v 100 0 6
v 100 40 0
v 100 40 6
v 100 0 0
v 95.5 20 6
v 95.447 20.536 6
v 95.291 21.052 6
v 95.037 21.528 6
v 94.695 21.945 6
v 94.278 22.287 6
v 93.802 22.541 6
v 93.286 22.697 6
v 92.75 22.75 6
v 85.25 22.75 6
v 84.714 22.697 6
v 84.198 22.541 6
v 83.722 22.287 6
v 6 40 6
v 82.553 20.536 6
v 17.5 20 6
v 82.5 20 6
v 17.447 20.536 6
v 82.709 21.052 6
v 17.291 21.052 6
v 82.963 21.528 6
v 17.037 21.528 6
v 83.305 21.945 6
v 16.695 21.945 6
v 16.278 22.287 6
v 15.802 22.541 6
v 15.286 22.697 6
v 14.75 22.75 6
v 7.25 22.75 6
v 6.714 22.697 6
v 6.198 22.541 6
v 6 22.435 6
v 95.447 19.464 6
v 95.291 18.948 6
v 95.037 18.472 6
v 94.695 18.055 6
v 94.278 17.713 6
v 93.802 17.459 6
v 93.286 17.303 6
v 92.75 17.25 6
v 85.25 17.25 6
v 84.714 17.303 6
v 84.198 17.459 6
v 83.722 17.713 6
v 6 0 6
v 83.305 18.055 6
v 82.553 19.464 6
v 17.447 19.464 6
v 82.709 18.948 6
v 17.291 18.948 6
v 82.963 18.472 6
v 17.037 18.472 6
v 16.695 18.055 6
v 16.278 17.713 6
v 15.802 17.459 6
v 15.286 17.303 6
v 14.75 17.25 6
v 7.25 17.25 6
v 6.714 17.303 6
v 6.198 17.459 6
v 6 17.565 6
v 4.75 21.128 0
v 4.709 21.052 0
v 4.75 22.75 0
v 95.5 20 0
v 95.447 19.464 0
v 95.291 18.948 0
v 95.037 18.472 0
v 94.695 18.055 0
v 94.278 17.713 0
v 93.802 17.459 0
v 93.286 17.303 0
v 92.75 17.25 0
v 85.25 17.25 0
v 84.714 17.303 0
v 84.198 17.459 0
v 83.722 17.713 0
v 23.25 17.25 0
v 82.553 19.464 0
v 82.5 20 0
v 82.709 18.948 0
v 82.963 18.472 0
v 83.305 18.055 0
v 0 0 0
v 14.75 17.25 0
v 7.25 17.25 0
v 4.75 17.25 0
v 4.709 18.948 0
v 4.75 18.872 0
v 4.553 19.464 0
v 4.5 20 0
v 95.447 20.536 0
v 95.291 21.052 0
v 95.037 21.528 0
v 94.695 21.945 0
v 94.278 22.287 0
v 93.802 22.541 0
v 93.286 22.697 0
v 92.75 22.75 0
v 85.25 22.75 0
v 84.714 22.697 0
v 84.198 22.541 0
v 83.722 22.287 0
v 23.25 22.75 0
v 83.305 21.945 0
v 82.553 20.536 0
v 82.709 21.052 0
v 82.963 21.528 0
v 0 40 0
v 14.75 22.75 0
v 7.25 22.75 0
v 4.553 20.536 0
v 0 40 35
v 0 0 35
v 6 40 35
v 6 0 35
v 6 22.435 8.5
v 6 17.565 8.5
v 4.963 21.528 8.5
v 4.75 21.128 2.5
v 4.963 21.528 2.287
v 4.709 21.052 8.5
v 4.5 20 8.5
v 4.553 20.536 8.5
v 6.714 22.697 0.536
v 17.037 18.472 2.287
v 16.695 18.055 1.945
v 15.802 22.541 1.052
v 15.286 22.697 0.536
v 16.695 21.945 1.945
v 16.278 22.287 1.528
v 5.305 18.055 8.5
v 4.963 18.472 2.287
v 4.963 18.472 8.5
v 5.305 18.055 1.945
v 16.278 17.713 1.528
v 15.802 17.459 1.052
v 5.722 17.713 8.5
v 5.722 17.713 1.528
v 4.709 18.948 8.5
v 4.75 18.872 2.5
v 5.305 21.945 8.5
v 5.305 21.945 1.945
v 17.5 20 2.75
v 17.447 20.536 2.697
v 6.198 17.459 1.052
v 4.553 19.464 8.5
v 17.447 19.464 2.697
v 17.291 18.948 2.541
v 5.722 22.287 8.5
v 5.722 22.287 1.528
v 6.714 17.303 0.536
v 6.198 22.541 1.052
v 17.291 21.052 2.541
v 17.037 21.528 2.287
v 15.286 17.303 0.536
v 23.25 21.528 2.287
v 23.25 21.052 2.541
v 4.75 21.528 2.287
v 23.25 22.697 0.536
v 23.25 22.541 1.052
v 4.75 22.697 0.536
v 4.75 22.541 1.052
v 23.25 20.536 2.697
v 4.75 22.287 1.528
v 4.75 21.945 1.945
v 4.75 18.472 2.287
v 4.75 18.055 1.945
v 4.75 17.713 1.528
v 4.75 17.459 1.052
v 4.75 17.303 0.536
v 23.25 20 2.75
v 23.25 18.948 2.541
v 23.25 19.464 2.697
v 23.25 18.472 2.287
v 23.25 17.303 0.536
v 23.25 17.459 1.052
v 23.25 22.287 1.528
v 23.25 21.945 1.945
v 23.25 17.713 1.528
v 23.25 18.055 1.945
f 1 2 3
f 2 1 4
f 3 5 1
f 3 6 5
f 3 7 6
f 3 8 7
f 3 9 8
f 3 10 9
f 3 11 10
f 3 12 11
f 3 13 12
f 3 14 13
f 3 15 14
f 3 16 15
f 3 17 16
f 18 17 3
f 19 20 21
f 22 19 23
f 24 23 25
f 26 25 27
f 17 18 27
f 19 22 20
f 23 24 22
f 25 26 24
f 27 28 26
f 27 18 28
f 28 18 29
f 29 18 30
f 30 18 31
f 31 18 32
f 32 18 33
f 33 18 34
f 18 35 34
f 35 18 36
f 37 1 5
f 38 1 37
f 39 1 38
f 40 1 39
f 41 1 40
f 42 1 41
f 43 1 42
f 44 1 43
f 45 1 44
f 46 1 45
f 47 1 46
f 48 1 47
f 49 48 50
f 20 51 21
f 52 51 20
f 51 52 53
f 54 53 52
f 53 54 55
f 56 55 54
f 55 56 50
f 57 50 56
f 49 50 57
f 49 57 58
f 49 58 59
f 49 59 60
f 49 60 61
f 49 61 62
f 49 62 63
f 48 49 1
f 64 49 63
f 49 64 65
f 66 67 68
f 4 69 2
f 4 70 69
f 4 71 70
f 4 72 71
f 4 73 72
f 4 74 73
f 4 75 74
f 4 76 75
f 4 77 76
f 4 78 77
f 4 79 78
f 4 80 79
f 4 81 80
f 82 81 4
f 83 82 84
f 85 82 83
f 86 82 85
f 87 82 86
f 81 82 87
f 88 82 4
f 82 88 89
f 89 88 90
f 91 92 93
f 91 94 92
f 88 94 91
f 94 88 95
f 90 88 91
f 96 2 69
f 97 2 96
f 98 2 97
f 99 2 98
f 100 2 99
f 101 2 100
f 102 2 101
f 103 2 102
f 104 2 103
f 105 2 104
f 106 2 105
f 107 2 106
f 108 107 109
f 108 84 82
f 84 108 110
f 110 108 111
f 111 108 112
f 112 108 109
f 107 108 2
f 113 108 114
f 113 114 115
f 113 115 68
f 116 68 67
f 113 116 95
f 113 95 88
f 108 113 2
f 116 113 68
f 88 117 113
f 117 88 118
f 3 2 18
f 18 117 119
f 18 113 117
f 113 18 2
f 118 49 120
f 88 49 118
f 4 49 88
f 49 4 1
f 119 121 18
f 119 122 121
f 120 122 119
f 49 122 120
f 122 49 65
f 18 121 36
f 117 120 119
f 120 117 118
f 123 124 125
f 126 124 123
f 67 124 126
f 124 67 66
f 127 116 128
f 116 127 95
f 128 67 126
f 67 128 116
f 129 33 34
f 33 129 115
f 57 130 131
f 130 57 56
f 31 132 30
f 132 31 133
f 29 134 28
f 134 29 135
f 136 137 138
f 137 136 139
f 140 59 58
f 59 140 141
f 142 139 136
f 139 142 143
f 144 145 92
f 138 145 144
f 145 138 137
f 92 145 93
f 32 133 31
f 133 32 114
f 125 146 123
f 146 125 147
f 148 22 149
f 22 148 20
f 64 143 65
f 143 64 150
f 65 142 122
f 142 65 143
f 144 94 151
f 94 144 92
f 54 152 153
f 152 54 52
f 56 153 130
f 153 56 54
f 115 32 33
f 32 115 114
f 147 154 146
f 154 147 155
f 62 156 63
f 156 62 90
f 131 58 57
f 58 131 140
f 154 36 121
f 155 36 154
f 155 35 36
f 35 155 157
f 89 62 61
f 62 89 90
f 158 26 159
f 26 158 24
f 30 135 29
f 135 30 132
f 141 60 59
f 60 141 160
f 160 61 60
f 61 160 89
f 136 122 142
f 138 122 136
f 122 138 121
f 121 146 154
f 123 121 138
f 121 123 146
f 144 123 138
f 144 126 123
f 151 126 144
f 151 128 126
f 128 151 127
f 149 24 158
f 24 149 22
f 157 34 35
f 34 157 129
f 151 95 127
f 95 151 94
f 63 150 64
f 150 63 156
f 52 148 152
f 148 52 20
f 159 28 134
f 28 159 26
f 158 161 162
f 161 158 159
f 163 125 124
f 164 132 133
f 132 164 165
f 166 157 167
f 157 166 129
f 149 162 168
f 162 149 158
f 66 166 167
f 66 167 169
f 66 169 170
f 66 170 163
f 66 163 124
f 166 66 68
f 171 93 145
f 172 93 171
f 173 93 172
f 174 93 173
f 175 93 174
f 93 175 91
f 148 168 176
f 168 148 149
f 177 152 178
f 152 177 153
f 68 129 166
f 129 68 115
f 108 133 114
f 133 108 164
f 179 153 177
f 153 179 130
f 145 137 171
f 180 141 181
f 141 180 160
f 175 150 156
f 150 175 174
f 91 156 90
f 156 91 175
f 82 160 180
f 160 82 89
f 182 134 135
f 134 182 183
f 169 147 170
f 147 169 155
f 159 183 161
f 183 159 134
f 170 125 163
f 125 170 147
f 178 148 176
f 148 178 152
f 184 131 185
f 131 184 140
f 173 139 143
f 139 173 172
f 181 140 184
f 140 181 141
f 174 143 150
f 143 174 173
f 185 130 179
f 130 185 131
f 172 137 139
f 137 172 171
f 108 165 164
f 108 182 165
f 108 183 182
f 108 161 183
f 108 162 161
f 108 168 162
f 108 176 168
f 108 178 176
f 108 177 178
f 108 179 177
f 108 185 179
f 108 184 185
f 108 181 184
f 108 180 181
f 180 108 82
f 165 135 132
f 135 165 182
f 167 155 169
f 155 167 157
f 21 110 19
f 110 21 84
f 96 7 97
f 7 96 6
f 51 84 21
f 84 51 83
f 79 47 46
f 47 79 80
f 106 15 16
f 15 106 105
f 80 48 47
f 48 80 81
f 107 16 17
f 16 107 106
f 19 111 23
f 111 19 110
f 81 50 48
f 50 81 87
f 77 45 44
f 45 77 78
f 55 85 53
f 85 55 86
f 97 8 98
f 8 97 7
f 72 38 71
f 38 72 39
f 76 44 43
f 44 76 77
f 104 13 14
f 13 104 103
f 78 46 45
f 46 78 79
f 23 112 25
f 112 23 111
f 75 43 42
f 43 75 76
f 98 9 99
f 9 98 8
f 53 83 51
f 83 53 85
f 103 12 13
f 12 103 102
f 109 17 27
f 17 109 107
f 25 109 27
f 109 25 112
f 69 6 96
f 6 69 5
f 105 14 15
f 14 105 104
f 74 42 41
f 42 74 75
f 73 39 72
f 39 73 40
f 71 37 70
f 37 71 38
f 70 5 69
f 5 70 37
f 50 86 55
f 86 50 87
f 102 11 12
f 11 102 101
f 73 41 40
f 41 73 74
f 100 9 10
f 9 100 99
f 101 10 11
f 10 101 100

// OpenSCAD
$fn = 32;

// ----------------------------------------------------------------------
// L-bracket: 100 x 40 x 35 mm
// ----------------------------------------------------------------------

// --- parameters (mm) ---
leg_a = 100;              // horizontal leg, X
leg_b = 35;               // vertical leg, Z
depth = 40;               // bracket depth, Y
thick = 6;                // plate thickness
hole_d = 5.5;             // clearance for M5
slot_w = 5.5;             // euro screw slot width
slot_l = 13;              // euro screw slot length

module hole_z(px, py) {
  translate([px, py, -2.5]) cylinder(h = thick + 5, d = hole_d);
}
module hole_x(pz, py) {
  translate([-2.5, py, pz]) rotate([0, 90, 0]) cylinder(h = thick + 5, d = hole_d);
}
module euro_slot_z(px, py) {
  hull() {
    translate([px - (slot_l - slot_w) / 2, py, -2.5]) cylinder(h = thick + 5, d = slot_w);
    translate([px + (slot_l - slot_w) / 2, py, -2.5]) cylinder(h = thick + 5, d = slot_w);
  }
}
module euro_slot_x(pz, py) {
  translate([-2.5, 0, 0]) rotate([0, 90, 0]) hull() {
    translate([0, py, pz - (slot_l - slot_w) / 2]) cylinder(h = thick + 5, d = slot_w);
    translate([0, py, pz + (slot_l - slot_w) / 2]) cylinder(h = thick + 5, d = slot_w);
  }
}

difference() {
  union() {
    /* horizontal leg */
    cube([leg_a, depth, thick]);
    /* vertical leg, overlapping the corner block */
    cube([thick, depth, leg_b]);
  }
  euro_slot_z(11, 20);
  euro_slot_x(11, 20);
  euro_slot_z(89, 20);
}
